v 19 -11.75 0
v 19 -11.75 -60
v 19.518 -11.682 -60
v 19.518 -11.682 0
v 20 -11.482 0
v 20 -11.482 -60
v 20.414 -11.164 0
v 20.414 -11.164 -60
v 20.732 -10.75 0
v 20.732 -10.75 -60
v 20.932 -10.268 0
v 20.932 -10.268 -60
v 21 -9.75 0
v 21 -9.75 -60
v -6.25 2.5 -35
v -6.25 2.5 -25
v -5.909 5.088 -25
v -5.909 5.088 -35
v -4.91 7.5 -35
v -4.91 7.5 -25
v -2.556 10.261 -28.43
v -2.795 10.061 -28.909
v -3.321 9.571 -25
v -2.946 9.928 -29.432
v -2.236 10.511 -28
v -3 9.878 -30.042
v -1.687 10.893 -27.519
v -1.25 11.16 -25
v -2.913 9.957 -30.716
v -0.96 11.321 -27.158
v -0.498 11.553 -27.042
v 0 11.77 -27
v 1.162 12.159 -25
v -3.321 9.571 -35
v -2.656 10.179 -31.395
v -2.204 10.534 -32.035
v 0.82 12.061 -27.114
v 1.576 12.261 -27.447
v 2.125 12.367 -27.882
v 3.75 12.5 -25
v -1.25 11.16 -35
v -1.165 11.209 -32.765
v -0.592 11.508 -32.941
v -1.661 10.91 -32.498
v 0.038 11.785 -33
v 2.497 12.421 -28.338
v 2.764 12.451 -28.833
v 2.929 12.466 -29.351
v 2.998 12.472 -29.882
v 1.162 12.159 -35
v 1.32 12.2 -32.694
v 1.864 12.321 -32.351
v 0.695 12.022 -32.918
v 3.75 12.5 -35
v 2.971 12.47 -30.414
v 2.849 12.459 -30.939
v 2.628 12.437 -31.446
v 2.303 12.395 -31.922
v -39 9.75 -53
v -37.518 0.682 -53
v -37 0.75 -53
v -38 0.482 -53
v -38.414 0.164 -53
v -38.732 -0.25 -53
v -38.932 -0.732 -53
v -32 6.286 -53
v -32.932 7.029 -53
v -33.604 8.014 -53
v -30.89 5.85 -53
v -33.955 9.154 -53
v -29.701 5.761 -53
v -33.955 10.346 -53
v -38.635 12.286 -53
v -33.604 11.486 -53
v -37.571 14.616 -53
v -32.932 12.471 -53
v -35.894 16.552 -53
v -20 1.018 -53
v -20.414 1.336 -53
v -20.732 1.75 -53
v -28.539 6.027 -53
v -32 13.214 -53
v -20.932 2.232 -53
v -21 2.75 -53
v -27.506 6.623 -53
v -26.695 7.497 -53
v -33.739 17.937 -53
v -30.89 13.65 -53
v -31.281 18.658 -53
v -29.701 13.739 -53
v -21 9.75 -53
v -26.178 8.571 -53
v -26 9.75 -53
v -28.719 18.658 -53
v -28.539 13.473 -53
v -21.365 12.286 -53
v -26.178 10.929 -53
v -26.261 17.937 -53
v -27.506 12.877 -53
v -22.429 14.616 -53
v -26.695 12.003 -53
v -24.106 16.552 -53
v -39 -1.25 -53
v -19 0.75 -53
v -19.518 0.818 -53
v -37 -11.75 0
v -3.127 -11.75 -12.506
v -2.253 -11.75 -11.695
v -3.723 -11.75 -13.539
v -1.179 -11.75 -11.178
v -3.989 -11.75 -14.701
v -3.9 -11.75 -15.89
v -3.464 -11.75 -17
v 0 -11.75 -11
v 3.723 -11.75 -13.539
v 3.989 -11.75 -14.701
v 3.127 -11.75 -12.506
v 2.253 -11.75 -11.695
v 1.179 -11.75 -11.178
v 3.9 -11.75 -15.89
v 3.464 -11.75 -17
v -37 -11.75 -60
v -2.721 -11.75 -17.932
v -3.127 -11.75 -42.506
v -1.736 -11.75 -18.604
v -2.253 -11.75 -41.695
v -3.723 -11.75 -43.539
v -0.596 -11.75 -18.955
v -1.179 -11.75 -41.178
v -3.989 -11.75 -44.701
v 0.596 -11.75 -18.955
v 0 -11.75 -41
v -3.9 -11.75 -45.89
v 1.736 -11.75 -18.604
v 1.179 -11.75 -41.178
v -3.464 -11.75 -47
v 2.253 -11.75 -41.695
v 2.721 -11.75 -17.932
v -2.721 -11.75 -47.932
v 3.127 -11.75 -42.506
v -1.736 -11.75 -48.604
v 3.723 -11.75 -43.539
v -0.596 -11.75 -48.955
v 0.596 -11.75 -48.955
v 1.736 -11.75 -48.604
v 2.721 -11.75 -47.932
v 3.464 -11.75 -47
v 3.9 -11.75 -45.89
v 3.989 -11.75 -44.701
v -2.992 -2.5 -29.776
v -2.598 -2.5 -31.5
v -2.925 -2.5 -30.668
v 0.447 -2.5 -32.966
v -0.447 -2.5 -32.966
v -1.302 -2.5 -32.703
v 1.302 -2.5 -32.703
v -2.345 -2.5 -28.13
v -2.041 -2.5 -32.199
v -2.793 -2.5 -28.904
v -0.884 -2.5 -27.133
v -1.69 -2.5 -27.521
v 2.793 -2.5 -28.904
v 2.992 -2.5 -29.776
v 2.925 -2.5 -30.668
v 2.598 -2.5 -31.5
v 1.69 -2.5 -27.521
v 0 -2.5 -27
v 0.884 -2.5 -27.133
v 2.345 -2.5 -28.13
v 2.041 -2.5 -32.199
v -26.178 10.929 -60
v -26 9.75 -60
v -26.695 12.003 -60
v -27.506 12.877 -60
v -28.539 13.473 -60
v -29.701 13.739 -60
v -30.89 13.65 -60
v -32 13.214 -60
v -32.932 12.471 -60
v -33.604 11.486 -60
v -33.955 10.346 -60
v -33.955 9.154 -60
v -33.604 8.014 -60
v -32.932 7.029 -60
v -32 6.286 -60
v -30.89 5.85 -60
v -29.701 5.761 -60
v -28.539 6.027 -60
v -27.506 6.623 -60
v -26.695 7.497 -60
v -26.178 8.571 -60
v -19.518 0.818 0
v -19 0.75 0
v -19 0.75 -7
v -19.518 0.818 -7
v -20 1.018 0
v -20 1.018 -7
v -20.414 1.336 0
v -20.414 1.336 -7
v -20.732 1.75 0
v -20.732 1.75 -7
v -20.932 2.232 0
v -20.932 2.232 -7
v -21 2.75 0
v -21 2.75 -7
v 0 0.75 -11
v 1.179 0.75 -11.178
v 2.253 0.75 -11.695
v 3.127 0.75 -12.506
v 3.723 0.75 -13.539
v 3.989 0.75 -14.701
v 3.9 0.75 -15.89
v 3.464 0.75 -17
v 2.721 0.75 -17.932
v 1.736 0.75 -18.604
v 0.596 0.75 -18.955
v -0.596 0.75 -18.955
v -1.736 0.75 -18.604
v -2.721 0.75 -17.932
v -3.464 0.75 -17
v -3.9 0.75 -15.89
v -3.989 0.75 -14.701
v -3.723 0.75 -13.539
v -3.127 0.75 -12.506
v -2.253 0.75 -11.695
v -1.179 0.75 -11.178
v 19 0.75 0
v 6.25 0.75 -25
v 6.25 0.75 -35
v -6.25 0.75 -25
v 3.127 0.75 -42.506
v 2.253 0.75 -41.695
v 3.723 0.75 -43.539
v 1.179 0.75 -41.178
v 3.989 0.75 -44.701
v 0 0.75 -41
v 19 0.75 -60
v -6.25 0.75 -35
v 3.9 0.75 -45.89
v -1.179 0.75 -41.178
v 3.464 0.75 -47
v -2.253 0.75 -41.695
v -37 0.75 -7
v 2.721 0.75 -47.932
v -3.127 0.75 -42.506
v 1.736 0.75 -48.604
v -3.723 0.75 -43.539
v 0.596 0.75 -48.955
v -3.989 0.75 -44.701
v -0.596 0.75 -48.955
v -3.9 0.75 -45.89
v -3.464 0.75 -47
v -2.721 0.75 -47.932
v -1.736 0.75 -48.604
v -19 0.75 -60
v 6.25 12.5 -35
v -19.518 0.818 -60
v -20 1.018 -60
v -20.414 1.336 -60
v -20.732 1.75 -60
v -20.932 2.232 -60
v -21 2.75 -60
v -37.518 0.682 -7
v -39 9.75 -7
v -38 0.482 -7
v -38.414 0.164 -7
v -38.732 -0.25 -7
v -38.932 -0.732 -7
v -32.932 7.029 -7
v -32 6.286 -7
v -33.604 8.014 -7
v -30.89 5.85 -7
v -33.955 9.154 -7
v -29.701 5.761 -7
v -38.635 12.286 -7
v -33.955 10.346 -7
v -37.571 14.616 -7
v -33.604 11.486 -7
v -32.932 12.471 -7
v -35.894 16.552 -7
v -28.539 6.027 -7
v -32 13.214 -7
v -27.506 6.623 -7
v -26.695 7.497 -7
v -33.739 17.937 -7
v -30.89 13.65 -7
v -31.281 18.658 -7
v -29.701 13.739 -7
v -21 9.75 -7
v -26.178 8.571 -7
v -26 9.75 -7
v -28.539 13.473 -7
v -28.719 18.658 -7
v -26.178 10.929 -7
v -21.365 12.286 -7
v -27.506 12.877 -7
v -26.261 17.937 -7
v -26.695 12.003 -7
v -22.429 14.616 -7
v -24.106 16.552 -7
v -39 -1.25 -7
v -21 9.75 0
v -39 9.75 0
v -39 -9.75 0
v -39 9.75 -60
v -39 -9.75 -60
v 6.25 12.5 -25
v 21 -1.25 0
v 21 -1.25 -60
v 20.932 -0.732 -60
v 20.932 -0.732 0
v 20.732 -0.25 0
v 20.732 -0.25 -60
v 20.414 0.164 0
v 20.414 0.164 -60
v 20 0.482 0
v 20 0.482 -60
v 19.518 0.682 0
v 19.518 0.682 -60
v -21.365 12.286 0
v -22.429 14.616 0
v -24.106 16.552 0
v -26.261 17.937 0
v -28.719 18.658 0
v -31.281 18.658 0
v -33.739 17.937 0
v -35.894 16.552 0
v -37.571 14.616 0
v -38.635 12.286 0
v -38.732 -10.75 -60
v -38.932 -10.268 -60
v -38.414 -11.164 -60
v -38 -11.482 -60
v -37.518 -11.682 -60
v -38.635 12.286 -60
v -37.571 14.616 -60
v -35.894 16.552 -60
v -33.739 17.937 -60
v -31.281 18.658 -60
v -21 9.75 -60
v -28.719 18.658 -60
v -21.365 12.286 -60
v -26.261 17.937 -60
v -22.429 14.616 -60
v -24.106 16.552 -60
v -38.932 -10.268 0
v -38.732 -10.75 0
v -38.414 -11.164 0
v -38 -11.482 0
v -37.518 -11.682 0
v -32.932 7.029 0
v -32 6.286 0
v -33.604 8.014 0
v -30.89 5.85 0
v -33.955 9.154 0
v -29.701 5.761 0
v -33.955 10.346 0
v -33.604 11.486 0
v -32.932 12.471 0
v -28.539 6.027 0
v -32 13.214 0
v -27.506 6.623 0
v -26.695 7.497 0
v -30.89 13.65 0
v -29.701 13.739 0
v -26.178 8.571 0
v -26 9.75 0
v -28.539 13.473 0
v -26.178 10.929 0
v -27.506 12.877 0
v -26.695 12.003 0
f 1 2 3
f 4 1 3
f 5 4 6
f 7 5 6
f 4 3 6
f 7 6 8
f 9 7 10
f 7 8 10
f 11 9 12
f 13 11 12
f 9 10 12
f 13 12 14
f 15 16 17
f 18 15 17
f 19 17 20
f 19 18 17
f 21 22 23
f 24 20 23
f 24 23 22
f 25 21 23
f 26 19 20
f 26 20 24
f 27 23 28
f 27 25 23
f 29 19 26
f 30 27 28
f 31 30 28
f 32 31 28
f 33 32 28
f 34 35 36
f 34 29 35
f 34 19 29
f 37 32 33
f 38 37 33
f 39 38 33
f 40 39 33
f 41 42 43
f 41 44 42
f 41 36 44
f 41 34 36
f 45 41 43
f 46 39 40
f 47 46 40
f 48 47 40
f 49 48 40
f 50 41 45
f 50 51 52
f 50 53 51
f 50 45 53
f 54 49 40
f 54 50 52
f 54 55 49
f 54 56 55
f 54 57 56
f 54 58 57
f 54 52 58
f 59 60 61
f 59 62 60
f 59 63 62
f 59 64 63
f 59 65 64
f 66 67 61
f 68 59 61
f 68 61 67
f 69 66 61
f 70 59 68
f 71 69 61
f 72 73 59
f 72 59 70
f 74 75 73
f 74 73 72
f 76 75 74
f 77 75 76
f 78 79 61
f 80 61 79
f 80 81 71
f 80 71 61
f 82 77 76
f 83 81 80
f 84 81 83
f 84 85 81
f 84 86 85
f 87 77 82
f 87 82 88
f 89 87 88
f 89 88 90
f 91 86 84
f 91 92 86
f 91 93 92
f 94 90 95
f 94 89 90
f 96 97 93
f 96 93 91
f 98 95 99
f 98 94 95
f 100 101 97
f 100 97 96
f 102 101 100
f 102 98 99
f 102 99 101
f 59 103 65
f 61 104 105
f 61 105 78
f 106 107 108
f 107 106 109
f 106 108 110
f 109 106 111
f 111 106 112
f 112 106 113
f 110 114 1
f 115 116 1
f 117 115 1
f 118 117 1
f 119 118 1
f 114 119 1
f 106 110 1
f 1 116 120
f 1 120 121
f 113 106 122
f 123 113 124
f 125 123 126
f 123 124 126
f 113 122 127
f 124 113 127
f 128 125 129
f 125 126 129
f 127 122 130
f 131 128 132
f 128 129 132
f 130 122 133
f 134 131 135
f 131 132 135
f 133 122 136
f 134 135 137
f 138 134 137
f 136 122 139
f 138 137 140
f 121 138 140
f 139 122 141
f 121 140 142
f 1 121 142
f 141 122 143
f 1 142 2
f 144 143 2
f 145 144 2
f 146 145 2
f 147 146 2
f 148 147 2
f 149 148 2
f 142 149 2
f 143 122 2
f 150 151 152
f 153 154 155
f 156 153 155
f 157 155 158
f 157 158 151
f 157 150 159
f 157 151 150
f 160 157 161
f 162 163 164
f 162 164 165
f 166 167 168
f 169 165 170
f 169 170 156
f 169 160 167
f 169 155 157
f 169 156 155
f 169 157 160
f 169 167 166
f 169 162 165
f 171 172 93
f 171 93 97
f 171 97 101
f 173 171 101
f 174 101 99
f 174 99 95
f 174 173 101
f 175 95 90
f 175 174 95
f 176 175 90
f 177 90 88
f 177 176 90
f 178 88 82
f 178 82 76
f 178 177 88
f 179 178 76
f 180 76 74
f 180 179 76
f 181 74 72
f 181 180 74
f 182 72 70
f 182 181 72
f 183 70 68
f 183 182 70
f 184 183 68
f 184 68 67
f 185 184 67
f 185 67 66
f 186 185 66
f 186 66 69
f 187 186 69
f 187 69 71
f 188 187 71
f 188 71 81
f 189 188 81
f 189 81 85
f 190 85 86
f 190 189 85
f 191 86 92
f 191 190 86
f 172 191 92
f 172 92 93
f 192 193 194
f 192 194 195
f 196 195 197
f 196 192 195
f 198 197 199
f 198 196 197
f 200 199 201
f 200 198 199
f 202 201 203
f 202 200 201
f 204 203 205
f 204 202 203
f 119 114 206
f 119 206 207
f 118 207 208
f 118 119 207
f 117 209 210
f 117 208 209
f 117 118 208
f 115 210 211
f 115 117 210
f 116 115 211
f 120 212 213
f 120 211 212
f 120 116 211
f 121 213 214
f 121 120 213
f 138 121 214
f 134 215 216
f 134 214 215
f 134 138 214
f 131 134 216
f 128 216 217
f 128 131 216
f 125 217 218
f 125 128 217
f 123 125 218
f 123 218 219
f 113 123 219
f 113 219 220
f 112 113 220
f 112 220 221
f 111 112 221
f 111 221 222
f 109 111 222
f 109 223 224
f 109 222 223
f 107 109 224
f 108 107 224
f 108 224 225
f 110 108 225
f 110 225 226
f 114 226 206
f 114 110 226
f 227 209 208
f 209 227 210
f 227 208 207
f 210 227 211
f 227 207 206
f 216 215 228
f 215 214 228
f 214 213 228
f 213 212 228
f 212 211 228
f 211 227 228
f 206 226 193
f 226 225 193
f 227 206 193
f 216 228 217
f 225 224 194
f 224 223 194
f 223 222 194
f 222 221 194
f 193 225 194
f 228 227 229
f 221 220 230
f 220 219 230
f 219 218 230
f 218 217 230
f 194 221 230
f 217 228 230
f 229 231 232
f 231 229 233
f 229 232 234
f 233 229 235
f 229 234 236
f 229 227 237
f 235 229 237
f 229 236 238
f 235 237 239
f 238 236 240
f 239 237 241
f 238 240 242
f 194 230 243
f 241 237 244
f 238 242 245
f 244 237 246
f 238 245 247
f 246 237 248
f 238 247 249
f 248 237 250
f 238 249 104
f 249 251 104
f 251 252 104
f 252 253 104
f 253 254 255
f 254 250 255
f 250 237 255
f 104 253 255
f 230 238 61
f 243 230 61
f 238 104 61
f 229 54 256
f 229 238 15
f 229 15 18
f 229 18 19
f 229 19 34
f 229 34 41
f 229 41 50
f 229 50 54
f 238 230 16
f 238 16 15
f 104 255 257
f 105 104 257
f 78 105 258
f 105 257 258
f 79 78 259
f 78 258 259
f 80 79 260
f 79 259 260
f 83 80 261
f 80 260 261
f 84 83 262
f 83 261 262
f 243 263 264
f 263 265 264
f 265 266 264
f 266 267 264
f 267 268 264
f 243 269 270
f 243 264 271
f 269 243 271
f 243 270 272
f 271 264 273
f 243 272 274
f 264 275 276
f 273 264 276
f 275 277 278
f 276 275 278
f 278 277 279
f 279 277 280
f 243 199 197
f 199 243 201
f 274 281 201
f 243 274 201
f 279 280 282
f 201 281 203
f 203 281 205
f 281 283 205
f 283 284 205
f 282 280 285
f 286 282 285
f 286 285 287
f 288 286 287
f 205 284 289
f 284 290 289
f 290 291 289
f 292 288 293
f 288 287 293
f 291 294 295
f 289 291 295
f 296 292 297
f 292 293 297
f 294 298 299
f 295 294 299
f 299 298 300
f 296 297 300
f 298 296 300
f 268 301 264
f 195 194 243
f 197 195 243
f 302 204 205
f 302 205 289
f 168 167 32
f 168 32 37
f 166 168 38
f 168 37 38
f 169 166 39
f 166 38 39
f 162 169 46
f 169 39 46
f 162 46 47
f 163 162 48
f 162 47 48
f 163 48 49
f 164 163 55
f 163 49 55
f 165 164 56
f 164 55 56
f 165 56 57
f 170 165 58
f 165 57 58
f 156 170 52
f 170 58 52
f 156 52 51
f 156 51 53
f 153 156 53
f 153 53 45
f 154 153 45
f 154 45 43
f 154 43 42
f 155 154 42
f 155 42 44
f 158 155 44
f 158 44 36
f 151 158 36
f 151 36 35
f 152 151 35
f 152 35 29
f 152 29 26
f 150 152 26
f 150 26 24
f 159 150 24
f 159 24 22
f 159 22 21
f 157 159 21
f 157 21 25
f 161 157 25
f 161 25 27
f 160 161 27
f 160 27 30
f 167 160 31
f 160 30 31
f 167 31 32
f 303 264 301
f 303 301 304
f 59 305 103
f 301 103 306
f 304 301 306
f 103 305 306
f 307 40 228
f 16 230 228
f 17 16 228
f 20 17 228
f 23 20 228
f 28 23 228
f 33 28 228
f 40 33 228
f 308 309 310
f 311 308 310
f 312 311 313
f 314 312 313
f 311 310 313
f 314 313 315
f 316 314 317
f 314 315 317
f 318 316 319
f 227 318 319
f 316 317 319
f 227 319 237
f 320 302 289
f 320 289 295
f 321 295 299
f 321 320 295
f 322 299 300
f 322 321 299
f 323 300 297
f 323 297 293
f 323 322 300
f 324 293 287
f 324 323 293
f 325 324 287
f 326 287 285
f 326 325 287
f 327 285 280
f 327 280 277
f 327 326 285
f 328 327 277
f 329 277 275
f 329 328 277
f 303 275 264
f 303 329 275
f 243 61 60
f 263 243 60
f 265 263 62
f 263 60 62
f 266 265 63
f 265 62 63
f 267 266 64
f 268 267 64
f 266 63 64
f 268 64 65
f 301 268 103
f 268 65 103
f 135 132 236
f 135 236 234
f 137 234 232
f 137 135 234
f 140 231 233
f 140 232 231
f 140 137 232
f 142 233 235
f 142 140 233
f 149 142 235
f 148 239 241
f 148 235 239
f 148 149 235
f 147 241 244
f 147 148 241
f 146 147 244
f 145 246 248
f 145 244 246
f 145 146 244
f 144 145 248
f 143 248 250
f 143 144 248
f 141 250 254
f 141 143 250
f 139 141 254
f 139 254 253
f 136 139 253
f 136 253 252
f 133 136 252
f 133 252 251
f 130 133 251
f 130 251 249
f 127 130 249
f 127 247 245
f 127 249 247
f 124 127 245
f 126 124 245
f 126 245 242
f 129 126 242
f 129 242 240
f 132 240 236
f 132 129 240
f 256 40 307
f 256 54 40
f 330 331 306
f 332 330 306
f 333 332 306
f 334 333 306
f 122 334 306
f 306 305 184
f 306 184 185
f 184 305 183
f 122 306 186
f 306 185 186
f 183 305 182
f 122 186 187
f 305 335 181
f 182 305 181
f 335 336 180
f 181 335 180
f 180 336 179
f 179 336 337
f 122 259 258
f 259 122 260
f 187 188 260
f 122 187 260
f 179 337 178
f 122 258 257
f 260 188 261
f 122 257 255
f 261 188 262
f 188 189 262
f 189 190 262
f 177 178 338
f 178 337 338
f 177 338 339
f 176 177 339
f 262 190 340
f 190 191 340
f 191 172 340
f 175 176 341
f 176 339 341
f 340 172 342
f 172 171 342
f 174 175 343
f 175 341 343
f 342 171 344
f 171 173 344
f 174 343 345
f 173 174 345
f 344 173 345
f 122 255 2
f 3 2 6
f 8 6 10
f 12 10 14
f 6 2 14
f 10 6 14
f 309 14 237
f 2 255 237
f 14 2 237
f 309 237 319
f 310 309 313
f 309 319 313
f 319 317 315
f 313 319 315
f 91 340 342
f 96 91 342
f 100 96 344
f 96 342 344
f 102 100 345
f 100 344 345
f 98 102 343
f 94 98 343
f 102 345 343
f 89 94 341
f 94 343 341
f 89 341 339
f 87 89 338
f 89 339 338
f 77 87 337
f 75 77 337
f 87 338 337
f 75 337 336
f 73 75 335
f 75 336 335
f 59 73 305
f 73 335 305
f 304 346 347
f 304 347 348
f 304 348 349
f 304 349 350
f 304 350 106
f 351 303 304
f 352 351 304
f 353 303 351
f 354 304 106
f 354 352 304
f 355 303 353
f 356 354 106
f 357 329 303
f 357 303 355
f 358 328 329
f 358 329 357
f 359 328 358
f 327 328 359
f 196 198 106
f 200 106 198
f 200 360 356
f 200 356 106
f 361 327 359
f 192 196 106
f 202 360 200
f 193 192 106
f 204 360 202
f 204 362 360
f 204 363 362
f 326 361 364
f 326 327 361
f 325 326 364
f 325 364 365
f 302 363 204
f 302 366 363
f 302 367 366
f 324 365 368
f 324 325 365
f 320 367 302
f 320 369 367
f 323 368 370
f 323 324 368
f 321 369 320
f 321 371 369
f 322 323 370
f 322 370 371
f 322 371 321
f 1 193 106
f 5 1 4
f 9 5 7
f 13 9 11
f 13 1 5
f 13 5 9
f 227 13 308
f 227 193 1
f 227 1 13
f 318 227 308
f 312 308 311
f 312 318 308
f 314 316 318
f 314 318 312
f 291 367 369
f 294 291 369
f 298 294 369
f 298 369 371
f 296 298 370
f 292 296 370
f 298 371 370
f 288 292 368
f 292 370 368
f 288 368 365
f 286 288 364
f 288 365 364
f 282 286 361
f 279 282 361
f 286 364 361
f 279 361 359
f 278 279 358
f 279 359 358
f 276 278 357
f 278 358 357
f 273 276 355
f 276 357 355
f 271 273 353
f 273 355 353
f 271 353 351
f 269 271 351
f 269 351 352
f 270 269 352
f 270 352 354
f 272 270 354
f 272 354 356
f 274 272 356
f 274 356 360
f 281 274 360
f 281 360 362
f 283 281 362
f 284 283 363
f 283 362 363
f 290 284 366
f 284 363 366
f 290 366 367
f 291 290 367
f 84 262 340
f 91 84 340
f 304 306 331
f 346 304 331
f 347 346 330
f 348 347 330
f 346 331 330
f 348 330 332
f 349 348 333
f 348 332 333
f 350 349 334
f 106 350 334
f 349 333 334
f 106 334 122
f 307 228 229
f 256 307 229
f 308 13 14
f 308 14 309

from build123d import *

# Parameters (mm, degrees)
SKETCH1_R               = 4
BOSS_EXTRUDE2_DEPTH     = 7
BOSS_EXTRUDE3_DEPTH     = 23
CUT_EXTRUDE1_DEPTH      = 74.976770002
CUT_EXTRUDE1_DEPTH_BACK = 74.976770002
SKETCH5_R               = 4
SKETCH6_W               = 12.5
SKETCH6_H               = 10
BOSS_EXTRUDE4_DEPTH     = 12.5
FILLET1_R               = 10
SKETCH8_R               = 3
CUT_EXTRUDE2_DEPTH      = 15


with BuildPart() as part:
    # Sketch1 → Boss-Extrude2 (new body)
    with BuildSketch(Plane.XY):
        with BuildLine():
            Line((-37, -11.75), (19, -11.75))
            ThreePointArc((19, -11.75), (20.414213562, -11.164213562), (21, -9.75))
            Line((21, -9.75), (21, -1.25))
            ThreePointArc((21, -1.25), (20.414213562, 0.164213562), (19, 0.75))
            Line((19, 0.75), (-19, 0.75))
            ThreePointArc((-19, 0.75), (-20.414213562, 1.335786438), (-21, 2.75))
            Line((-21, 2.75), (-21, 9.75))
            ThreePointArc((-21, 9.75), (-30, 18.75), (-39, 9.75))
            Line((-39, 9.75), (-39, -9.75))
            ThreePointArc((-39, -9.75), (-38.414213562, -11.164213562), (-37, -11.75))
        make_face()
        with Locations((-30, 9.75)):
            Circle(SKETCH1_R, mode=Mode.SUBTRACT)
    boss_extrude2 = extrude(amount=-BOSS_EXTRUDE2_DEPTH)

    # Sketch4 → Boss-Extrude3 (add)
    with BuildSketch(Plane(origin=(0, 0, -7), x_dir=(-1, 0, 0), z_dir=(0, 0, -1))):
        with BuildLine():
            Line((19, 0.75), (37, 0.75))
            ThreePointArc((37, 0.75), (38.414213562, 0.164213562), (39, -1.25))
            Line((39, -1.25), (39, -9.75))
            ThreePointArc((39, -9.75), (38.414213562, -11.164213562), (37, -11.75))
            Line((37, -11.75), (-19, -11.75))
            ThreePointArc((-19, -11.75), (-20.414213562, -11.164213562), (-21, -9.75))
            Line((-21, -9.75), (-21, -1.25))
            ThreePointArc((-21, -1.25), (-20.414213562, 0.164213562), (-19, 0.75))
            Line((-19, 0.75), (19, 0.75))
        make_face()
    boss_extrude3 = extrude(amount=BOSS_EXTRUDE3_DEPTH)

    # Mirror2: Boss-Extrude3 across plane
    add(boss_extrude3.mirror(Plane(origin=(0, 0, -30), x_dir=(1, 0, 0), z_dir=(0, 0, -1))))

    # Mirror3: Boss-Extrude2 across plane
    add(boss_extrude2.mirror(Plane(origin=(0, 0, -30), x_dir=(1, 0, 0), z_dir=(0, 0, -1))))

    # Sketch5 → Cut-Extrude1 (cut, two sides: drawn at the far end of the back side and taken through both)
    with BuildSketch(Plane(origin=(0, 0, 0), x_dir=(1, 0, 0), z_dir=(0, 1, 0)).offset(-CUT_EXTRUDE1_DEPTH_BACK)):
        with Locations(Location((0, 45, 0), (0, 0, 270))):
            Circle(SKETCH5_R)
        with Locations(Location((0, 15, 0), (0, 0, 270))):
            Circle(SKETCH5_R)
    extrude(amount=CUT_EXTRUDE1_DEPTH + CUT_EXTRUDE1_DEPTH_BACK, mode=Mode.SUBTRACT)

    # Sketch6 → Boss-Extrude4 (add)
    with BuildSketch(Plane(origin=(0, 0, 0), x_dir=(1, 0, 0), z_dir=(0, 1, 0))):
        with Locations((0, 30)):
            Rectangle(SKETCH6_W, SKETCH6_H)
    extrude(amount=BOSS_EXTRUDE4_DEPTH)

    # Fillet1
    fillet1_edges = [part.edges().sort_by_distance(p)[0] for p in [
        (-6.25, 12.5, -30),
    ]]
    fillet(fillet1_edges, radius=FILLET1_R)

    # Sketch8 → Cut-Extrude2 (cut)
    with BuildSketch(Plane(origin=(0, 12.5, 0), x_dir=(1, 0, 0), z_dir=(0, 1, 0))):
        with Locations(Location((0, 30, 0), (0, 0, 270))):
            Circle(SKETCH8_R)
    extrude(amount=-CUT_EXTRUDE2_DEPTH, mode=Mode.SUBTRACT)


solid = part.part
